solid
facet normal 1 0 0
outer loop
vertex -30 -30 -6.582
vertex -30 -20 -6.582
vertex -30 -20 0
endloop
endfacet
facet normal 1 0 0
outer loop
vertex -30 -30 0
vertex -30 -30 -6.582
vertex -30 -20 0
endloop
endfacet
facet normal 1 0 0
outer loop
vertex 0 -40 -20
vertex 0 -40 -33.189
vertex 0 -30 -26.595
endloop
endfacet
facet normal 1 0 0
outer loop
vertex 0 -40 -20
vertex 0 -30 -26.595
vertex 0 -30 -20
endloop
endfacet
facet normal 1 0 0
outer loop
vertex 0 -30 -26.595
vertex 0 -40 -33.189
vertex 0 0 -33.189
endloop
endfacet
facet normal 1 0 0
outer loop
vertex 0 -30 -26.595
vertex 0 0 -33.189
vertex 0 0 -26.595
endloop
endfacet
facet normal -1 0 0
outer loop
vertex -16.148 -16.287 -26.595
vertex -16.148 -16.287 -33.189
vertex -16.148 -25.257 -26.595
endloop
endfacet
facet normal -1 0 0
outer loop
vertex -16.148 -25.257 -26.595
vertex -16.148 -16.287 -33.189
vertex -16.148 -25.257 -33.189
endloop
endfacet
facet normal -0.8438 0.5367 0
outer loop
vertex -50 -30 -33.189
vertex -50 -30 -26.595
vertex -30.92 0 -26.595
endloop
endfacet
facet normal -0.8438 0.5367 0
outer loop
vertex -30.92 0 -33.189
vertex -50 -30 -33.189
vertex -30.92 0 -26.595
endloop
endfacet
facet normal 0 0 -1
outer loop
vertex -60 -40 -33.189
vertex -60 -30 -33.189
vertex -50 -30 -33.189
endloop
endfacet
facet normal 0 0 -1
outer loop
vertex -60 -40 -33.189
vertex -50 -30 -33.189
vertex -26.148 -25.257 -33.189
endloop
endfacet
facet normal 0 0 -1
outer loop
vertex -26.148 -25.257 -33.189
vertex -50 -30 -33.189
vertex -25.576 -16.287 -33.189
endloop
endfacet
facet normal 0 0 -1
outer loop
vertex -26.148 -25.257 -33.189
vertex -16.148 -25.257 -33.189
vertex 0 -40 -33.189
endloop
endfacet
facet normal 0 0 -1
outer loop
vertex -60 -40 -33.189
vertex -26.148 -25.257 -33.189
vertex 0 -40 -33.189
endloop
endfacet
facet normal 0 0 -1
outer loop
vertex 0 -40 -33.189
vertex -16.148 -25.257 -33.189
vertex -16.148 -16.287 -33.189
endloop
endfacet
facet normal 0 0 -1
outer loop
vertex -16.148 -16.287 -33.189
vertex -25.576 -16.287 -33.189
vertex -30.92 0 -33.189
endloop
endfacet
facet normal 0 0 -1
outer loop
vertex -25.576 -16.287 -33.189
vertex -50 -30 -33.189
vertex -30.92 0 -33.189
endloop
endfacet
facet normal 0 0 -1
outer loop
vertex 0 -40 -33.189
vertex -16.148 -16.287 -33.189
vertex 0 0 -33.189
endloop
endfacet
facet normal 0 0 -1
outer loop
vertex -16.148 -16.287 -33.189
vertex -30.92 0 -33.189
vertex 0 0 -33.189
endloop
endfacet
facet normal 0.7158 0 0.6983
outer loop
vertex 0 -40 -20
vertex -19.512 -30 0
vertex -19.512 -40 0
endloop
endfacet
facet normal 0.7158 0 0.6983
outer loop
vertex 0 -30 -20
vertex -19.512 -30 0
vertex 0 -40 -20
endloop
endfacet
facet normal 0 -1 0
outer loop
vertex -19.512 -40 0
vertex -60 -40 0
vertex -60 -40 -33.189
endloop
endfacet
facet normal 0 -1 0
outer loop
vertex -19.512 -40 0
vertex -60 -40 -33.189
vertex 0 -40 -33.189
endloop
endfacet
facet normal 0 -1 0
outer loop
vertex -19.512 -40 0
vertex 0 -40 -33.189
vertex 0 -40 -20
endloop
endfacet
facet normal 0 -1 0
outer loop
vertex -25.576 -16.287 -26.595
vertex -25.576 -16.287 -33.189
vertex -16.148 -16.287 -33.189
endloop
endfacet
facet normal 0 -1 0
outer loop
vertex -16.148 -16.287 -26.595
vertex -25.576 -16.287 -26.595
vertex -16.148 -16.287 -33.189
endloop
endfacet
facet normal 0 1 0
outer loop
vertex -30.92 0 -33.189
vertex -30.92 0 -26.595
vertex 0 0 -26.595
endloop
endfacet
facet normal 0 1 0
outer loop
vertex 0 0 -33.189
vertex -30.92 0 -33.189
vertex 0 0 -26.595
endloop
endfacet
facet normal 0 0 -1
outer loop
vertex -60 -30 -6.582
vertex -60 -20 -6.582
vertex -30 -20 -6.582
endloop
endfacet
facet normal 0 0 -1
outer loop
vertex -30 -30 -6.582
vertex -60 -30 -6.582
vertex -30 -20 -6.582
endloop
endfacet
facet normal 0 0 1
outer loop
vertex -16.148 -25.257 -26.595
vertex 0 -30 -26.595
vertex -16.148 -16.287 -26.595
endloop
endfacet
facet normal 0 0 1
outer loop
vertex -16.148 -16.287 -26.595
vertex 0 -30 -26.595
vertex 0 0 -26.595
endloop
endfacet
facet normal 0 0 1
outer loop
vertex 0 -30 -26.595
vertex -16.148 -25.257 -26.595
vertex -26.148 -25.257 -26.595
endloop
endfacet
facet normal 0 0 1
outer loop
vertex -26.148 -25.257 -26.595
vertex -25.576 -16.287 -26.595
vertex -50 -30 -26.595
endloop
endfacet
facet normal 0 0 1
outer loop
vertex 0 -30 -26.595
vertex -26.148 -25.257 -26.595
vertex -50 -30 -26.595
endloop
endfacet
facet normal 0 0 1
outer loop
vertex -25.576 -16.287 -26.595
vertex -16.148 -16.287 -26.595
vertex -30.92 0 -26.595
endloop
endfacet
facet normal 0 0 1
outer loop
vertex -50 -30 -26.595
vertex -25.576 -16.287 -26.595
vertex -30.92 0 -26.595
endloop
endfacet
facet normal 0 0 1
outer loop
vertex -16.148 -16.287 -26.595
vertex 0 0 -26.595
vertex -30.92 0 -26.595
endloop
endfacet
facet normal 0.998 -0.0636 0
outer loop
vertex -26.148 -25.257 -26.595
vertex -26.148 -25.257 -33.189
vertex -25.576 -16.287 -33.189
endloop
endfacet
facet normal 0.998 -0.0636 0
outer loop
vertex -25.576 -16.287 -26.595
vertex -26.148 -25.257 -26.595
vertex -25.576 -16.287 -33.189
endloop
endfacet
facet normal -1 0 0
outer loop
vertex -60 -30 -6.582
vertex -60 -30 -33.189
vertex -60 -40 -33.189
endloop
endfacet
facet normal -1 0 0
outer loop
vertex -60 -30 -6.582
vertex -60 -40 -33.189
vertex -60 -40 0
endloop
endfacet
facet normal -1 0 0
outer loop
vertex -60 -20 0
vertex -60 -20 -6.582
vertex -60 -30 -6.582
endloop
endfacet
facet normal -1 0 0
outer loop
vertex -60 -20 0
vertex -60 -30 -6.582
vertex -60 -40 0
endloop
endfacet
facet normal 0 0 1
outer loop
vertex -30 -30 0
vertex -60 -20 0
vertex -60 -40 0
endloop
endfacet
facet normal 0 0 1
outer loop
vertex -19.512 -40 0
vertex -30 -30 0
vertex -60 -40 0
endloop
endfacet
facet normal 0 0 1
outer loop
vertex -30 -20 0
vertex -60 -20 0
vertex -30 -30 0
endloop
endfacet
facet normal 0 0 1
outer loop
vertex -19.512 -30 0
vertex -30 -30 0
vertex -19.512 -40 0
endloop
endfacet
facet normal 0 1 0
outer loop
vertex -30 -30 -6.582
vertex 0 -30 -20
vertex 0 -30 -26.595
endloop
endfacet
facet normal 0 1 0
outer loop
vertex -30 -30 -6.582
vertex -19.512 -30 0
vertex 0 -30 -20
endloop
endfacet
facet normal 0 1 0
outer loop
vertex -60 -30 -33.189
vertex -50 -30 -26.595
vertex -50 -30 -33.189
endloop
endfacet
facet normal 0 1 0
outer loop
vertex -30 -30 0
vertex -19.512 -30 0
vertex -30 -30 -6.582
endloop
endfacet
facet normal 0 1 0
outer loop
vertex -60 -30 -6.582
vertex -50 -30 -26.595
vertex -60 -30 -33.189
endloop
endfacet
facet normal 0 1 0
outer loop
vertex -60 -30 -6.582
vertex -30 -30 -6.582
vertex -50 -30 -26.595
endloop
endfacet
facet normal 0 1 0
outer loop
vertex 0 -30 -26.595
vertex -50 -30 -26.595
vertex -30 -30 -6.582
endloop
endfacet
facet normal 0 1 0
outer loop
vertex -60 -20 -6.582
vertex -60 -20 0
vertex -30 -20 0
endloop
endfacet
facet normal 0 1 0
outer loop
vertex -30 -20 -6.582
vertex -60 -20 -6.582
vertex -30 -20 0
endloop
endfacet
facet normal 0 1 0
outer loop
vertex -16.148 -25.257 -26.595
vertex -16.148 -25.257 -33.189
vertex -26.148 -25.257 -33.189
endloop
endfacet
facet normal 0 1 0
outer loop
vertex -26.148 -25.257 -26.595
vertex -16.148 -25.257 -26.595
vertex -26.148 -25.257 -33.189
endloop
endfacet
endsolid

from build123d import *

# Parameters (mm, degrees)
F0_W      = 60
F0_H      = 33.1892187767
F1_DEPTH  = 40
F3_DEPTH  = 41.91
F5_DEPTH  = 30
F6_DEPTH  = 20
F8_DEPTH  = 25.4
F10_DEPTH = 25.4


with BuildPart() as f1:
    # F0 (on Front) → F1 (new body)
    with BuildSketch(Plane.XZ):
        with Locations((-30, -16.5946093883)):
            Rectangle(F0_W, F0_H)
    extrude(amount=F1_DEPTH)

    # F2 (on Front) → F3 (cut)
    with BuildSketch(Plane.XZ):
        Polygon((0, -20), (0, 0), (-19.5117478243, 0), align=None)
    extrude(amount=F3_DEPTH, mode=Mode.SUBTRACT)

    # F4 (on face) → F5 (cut)
    with BuildSketch(Plane(origin=(0, 0, 0), x_dir=(-1, 0, 0), z_dir=(0, 1, 0))):
        Polygon((0, -20), (0, -26.5946093883), (50, -26.5946093883), (50, -33.1892187767), (60, -33.1892187767), (60, -6.581982132), (30, -6.581982132), (30, 0), (19.5117478243, 0), align=None)
    extrude(amount=-F5_DEPTH, mode=Mode.SUBTRACT)

    # F6 (cut): a face of the model
    f6_faces = [f1.faces().sort_by_distance(p)[0] for p in [
        (-45, 0, -3.290991066),
    ]]
    extrude(f6_faces, amount=-F6_DEPTH, mode=Mode.SUBTRACT)

    # F7 (on face) → F8 (cut)
    with BuildSketch(Plane.XY.offset(-26.5946093883)):
        Polygon((-50, 0), (-50, -30), (-30.9202261269, 0), align=None)
    extrude(amount=-F8_DEPTH, mode=Mode.SUBTRACT)

    # F9 (on face) → F10 (cut)
    with BuildSketch(Plane(origin=(0, 0, -33.1892187767), x_dir=(1, 0, 0), z_dir=(0, 0, -1))):
        Polygon((-25.575999478, 16.2872133739), (-16.1481829174, 16.2872133739), (-16.1481829174, 25.2565963231), (-26.1481829174, 25.2565963231), align=None)
    extrude(amount=-F10_DEPTH, mode=Mode.SUBTRACT)


solid = f1.part
